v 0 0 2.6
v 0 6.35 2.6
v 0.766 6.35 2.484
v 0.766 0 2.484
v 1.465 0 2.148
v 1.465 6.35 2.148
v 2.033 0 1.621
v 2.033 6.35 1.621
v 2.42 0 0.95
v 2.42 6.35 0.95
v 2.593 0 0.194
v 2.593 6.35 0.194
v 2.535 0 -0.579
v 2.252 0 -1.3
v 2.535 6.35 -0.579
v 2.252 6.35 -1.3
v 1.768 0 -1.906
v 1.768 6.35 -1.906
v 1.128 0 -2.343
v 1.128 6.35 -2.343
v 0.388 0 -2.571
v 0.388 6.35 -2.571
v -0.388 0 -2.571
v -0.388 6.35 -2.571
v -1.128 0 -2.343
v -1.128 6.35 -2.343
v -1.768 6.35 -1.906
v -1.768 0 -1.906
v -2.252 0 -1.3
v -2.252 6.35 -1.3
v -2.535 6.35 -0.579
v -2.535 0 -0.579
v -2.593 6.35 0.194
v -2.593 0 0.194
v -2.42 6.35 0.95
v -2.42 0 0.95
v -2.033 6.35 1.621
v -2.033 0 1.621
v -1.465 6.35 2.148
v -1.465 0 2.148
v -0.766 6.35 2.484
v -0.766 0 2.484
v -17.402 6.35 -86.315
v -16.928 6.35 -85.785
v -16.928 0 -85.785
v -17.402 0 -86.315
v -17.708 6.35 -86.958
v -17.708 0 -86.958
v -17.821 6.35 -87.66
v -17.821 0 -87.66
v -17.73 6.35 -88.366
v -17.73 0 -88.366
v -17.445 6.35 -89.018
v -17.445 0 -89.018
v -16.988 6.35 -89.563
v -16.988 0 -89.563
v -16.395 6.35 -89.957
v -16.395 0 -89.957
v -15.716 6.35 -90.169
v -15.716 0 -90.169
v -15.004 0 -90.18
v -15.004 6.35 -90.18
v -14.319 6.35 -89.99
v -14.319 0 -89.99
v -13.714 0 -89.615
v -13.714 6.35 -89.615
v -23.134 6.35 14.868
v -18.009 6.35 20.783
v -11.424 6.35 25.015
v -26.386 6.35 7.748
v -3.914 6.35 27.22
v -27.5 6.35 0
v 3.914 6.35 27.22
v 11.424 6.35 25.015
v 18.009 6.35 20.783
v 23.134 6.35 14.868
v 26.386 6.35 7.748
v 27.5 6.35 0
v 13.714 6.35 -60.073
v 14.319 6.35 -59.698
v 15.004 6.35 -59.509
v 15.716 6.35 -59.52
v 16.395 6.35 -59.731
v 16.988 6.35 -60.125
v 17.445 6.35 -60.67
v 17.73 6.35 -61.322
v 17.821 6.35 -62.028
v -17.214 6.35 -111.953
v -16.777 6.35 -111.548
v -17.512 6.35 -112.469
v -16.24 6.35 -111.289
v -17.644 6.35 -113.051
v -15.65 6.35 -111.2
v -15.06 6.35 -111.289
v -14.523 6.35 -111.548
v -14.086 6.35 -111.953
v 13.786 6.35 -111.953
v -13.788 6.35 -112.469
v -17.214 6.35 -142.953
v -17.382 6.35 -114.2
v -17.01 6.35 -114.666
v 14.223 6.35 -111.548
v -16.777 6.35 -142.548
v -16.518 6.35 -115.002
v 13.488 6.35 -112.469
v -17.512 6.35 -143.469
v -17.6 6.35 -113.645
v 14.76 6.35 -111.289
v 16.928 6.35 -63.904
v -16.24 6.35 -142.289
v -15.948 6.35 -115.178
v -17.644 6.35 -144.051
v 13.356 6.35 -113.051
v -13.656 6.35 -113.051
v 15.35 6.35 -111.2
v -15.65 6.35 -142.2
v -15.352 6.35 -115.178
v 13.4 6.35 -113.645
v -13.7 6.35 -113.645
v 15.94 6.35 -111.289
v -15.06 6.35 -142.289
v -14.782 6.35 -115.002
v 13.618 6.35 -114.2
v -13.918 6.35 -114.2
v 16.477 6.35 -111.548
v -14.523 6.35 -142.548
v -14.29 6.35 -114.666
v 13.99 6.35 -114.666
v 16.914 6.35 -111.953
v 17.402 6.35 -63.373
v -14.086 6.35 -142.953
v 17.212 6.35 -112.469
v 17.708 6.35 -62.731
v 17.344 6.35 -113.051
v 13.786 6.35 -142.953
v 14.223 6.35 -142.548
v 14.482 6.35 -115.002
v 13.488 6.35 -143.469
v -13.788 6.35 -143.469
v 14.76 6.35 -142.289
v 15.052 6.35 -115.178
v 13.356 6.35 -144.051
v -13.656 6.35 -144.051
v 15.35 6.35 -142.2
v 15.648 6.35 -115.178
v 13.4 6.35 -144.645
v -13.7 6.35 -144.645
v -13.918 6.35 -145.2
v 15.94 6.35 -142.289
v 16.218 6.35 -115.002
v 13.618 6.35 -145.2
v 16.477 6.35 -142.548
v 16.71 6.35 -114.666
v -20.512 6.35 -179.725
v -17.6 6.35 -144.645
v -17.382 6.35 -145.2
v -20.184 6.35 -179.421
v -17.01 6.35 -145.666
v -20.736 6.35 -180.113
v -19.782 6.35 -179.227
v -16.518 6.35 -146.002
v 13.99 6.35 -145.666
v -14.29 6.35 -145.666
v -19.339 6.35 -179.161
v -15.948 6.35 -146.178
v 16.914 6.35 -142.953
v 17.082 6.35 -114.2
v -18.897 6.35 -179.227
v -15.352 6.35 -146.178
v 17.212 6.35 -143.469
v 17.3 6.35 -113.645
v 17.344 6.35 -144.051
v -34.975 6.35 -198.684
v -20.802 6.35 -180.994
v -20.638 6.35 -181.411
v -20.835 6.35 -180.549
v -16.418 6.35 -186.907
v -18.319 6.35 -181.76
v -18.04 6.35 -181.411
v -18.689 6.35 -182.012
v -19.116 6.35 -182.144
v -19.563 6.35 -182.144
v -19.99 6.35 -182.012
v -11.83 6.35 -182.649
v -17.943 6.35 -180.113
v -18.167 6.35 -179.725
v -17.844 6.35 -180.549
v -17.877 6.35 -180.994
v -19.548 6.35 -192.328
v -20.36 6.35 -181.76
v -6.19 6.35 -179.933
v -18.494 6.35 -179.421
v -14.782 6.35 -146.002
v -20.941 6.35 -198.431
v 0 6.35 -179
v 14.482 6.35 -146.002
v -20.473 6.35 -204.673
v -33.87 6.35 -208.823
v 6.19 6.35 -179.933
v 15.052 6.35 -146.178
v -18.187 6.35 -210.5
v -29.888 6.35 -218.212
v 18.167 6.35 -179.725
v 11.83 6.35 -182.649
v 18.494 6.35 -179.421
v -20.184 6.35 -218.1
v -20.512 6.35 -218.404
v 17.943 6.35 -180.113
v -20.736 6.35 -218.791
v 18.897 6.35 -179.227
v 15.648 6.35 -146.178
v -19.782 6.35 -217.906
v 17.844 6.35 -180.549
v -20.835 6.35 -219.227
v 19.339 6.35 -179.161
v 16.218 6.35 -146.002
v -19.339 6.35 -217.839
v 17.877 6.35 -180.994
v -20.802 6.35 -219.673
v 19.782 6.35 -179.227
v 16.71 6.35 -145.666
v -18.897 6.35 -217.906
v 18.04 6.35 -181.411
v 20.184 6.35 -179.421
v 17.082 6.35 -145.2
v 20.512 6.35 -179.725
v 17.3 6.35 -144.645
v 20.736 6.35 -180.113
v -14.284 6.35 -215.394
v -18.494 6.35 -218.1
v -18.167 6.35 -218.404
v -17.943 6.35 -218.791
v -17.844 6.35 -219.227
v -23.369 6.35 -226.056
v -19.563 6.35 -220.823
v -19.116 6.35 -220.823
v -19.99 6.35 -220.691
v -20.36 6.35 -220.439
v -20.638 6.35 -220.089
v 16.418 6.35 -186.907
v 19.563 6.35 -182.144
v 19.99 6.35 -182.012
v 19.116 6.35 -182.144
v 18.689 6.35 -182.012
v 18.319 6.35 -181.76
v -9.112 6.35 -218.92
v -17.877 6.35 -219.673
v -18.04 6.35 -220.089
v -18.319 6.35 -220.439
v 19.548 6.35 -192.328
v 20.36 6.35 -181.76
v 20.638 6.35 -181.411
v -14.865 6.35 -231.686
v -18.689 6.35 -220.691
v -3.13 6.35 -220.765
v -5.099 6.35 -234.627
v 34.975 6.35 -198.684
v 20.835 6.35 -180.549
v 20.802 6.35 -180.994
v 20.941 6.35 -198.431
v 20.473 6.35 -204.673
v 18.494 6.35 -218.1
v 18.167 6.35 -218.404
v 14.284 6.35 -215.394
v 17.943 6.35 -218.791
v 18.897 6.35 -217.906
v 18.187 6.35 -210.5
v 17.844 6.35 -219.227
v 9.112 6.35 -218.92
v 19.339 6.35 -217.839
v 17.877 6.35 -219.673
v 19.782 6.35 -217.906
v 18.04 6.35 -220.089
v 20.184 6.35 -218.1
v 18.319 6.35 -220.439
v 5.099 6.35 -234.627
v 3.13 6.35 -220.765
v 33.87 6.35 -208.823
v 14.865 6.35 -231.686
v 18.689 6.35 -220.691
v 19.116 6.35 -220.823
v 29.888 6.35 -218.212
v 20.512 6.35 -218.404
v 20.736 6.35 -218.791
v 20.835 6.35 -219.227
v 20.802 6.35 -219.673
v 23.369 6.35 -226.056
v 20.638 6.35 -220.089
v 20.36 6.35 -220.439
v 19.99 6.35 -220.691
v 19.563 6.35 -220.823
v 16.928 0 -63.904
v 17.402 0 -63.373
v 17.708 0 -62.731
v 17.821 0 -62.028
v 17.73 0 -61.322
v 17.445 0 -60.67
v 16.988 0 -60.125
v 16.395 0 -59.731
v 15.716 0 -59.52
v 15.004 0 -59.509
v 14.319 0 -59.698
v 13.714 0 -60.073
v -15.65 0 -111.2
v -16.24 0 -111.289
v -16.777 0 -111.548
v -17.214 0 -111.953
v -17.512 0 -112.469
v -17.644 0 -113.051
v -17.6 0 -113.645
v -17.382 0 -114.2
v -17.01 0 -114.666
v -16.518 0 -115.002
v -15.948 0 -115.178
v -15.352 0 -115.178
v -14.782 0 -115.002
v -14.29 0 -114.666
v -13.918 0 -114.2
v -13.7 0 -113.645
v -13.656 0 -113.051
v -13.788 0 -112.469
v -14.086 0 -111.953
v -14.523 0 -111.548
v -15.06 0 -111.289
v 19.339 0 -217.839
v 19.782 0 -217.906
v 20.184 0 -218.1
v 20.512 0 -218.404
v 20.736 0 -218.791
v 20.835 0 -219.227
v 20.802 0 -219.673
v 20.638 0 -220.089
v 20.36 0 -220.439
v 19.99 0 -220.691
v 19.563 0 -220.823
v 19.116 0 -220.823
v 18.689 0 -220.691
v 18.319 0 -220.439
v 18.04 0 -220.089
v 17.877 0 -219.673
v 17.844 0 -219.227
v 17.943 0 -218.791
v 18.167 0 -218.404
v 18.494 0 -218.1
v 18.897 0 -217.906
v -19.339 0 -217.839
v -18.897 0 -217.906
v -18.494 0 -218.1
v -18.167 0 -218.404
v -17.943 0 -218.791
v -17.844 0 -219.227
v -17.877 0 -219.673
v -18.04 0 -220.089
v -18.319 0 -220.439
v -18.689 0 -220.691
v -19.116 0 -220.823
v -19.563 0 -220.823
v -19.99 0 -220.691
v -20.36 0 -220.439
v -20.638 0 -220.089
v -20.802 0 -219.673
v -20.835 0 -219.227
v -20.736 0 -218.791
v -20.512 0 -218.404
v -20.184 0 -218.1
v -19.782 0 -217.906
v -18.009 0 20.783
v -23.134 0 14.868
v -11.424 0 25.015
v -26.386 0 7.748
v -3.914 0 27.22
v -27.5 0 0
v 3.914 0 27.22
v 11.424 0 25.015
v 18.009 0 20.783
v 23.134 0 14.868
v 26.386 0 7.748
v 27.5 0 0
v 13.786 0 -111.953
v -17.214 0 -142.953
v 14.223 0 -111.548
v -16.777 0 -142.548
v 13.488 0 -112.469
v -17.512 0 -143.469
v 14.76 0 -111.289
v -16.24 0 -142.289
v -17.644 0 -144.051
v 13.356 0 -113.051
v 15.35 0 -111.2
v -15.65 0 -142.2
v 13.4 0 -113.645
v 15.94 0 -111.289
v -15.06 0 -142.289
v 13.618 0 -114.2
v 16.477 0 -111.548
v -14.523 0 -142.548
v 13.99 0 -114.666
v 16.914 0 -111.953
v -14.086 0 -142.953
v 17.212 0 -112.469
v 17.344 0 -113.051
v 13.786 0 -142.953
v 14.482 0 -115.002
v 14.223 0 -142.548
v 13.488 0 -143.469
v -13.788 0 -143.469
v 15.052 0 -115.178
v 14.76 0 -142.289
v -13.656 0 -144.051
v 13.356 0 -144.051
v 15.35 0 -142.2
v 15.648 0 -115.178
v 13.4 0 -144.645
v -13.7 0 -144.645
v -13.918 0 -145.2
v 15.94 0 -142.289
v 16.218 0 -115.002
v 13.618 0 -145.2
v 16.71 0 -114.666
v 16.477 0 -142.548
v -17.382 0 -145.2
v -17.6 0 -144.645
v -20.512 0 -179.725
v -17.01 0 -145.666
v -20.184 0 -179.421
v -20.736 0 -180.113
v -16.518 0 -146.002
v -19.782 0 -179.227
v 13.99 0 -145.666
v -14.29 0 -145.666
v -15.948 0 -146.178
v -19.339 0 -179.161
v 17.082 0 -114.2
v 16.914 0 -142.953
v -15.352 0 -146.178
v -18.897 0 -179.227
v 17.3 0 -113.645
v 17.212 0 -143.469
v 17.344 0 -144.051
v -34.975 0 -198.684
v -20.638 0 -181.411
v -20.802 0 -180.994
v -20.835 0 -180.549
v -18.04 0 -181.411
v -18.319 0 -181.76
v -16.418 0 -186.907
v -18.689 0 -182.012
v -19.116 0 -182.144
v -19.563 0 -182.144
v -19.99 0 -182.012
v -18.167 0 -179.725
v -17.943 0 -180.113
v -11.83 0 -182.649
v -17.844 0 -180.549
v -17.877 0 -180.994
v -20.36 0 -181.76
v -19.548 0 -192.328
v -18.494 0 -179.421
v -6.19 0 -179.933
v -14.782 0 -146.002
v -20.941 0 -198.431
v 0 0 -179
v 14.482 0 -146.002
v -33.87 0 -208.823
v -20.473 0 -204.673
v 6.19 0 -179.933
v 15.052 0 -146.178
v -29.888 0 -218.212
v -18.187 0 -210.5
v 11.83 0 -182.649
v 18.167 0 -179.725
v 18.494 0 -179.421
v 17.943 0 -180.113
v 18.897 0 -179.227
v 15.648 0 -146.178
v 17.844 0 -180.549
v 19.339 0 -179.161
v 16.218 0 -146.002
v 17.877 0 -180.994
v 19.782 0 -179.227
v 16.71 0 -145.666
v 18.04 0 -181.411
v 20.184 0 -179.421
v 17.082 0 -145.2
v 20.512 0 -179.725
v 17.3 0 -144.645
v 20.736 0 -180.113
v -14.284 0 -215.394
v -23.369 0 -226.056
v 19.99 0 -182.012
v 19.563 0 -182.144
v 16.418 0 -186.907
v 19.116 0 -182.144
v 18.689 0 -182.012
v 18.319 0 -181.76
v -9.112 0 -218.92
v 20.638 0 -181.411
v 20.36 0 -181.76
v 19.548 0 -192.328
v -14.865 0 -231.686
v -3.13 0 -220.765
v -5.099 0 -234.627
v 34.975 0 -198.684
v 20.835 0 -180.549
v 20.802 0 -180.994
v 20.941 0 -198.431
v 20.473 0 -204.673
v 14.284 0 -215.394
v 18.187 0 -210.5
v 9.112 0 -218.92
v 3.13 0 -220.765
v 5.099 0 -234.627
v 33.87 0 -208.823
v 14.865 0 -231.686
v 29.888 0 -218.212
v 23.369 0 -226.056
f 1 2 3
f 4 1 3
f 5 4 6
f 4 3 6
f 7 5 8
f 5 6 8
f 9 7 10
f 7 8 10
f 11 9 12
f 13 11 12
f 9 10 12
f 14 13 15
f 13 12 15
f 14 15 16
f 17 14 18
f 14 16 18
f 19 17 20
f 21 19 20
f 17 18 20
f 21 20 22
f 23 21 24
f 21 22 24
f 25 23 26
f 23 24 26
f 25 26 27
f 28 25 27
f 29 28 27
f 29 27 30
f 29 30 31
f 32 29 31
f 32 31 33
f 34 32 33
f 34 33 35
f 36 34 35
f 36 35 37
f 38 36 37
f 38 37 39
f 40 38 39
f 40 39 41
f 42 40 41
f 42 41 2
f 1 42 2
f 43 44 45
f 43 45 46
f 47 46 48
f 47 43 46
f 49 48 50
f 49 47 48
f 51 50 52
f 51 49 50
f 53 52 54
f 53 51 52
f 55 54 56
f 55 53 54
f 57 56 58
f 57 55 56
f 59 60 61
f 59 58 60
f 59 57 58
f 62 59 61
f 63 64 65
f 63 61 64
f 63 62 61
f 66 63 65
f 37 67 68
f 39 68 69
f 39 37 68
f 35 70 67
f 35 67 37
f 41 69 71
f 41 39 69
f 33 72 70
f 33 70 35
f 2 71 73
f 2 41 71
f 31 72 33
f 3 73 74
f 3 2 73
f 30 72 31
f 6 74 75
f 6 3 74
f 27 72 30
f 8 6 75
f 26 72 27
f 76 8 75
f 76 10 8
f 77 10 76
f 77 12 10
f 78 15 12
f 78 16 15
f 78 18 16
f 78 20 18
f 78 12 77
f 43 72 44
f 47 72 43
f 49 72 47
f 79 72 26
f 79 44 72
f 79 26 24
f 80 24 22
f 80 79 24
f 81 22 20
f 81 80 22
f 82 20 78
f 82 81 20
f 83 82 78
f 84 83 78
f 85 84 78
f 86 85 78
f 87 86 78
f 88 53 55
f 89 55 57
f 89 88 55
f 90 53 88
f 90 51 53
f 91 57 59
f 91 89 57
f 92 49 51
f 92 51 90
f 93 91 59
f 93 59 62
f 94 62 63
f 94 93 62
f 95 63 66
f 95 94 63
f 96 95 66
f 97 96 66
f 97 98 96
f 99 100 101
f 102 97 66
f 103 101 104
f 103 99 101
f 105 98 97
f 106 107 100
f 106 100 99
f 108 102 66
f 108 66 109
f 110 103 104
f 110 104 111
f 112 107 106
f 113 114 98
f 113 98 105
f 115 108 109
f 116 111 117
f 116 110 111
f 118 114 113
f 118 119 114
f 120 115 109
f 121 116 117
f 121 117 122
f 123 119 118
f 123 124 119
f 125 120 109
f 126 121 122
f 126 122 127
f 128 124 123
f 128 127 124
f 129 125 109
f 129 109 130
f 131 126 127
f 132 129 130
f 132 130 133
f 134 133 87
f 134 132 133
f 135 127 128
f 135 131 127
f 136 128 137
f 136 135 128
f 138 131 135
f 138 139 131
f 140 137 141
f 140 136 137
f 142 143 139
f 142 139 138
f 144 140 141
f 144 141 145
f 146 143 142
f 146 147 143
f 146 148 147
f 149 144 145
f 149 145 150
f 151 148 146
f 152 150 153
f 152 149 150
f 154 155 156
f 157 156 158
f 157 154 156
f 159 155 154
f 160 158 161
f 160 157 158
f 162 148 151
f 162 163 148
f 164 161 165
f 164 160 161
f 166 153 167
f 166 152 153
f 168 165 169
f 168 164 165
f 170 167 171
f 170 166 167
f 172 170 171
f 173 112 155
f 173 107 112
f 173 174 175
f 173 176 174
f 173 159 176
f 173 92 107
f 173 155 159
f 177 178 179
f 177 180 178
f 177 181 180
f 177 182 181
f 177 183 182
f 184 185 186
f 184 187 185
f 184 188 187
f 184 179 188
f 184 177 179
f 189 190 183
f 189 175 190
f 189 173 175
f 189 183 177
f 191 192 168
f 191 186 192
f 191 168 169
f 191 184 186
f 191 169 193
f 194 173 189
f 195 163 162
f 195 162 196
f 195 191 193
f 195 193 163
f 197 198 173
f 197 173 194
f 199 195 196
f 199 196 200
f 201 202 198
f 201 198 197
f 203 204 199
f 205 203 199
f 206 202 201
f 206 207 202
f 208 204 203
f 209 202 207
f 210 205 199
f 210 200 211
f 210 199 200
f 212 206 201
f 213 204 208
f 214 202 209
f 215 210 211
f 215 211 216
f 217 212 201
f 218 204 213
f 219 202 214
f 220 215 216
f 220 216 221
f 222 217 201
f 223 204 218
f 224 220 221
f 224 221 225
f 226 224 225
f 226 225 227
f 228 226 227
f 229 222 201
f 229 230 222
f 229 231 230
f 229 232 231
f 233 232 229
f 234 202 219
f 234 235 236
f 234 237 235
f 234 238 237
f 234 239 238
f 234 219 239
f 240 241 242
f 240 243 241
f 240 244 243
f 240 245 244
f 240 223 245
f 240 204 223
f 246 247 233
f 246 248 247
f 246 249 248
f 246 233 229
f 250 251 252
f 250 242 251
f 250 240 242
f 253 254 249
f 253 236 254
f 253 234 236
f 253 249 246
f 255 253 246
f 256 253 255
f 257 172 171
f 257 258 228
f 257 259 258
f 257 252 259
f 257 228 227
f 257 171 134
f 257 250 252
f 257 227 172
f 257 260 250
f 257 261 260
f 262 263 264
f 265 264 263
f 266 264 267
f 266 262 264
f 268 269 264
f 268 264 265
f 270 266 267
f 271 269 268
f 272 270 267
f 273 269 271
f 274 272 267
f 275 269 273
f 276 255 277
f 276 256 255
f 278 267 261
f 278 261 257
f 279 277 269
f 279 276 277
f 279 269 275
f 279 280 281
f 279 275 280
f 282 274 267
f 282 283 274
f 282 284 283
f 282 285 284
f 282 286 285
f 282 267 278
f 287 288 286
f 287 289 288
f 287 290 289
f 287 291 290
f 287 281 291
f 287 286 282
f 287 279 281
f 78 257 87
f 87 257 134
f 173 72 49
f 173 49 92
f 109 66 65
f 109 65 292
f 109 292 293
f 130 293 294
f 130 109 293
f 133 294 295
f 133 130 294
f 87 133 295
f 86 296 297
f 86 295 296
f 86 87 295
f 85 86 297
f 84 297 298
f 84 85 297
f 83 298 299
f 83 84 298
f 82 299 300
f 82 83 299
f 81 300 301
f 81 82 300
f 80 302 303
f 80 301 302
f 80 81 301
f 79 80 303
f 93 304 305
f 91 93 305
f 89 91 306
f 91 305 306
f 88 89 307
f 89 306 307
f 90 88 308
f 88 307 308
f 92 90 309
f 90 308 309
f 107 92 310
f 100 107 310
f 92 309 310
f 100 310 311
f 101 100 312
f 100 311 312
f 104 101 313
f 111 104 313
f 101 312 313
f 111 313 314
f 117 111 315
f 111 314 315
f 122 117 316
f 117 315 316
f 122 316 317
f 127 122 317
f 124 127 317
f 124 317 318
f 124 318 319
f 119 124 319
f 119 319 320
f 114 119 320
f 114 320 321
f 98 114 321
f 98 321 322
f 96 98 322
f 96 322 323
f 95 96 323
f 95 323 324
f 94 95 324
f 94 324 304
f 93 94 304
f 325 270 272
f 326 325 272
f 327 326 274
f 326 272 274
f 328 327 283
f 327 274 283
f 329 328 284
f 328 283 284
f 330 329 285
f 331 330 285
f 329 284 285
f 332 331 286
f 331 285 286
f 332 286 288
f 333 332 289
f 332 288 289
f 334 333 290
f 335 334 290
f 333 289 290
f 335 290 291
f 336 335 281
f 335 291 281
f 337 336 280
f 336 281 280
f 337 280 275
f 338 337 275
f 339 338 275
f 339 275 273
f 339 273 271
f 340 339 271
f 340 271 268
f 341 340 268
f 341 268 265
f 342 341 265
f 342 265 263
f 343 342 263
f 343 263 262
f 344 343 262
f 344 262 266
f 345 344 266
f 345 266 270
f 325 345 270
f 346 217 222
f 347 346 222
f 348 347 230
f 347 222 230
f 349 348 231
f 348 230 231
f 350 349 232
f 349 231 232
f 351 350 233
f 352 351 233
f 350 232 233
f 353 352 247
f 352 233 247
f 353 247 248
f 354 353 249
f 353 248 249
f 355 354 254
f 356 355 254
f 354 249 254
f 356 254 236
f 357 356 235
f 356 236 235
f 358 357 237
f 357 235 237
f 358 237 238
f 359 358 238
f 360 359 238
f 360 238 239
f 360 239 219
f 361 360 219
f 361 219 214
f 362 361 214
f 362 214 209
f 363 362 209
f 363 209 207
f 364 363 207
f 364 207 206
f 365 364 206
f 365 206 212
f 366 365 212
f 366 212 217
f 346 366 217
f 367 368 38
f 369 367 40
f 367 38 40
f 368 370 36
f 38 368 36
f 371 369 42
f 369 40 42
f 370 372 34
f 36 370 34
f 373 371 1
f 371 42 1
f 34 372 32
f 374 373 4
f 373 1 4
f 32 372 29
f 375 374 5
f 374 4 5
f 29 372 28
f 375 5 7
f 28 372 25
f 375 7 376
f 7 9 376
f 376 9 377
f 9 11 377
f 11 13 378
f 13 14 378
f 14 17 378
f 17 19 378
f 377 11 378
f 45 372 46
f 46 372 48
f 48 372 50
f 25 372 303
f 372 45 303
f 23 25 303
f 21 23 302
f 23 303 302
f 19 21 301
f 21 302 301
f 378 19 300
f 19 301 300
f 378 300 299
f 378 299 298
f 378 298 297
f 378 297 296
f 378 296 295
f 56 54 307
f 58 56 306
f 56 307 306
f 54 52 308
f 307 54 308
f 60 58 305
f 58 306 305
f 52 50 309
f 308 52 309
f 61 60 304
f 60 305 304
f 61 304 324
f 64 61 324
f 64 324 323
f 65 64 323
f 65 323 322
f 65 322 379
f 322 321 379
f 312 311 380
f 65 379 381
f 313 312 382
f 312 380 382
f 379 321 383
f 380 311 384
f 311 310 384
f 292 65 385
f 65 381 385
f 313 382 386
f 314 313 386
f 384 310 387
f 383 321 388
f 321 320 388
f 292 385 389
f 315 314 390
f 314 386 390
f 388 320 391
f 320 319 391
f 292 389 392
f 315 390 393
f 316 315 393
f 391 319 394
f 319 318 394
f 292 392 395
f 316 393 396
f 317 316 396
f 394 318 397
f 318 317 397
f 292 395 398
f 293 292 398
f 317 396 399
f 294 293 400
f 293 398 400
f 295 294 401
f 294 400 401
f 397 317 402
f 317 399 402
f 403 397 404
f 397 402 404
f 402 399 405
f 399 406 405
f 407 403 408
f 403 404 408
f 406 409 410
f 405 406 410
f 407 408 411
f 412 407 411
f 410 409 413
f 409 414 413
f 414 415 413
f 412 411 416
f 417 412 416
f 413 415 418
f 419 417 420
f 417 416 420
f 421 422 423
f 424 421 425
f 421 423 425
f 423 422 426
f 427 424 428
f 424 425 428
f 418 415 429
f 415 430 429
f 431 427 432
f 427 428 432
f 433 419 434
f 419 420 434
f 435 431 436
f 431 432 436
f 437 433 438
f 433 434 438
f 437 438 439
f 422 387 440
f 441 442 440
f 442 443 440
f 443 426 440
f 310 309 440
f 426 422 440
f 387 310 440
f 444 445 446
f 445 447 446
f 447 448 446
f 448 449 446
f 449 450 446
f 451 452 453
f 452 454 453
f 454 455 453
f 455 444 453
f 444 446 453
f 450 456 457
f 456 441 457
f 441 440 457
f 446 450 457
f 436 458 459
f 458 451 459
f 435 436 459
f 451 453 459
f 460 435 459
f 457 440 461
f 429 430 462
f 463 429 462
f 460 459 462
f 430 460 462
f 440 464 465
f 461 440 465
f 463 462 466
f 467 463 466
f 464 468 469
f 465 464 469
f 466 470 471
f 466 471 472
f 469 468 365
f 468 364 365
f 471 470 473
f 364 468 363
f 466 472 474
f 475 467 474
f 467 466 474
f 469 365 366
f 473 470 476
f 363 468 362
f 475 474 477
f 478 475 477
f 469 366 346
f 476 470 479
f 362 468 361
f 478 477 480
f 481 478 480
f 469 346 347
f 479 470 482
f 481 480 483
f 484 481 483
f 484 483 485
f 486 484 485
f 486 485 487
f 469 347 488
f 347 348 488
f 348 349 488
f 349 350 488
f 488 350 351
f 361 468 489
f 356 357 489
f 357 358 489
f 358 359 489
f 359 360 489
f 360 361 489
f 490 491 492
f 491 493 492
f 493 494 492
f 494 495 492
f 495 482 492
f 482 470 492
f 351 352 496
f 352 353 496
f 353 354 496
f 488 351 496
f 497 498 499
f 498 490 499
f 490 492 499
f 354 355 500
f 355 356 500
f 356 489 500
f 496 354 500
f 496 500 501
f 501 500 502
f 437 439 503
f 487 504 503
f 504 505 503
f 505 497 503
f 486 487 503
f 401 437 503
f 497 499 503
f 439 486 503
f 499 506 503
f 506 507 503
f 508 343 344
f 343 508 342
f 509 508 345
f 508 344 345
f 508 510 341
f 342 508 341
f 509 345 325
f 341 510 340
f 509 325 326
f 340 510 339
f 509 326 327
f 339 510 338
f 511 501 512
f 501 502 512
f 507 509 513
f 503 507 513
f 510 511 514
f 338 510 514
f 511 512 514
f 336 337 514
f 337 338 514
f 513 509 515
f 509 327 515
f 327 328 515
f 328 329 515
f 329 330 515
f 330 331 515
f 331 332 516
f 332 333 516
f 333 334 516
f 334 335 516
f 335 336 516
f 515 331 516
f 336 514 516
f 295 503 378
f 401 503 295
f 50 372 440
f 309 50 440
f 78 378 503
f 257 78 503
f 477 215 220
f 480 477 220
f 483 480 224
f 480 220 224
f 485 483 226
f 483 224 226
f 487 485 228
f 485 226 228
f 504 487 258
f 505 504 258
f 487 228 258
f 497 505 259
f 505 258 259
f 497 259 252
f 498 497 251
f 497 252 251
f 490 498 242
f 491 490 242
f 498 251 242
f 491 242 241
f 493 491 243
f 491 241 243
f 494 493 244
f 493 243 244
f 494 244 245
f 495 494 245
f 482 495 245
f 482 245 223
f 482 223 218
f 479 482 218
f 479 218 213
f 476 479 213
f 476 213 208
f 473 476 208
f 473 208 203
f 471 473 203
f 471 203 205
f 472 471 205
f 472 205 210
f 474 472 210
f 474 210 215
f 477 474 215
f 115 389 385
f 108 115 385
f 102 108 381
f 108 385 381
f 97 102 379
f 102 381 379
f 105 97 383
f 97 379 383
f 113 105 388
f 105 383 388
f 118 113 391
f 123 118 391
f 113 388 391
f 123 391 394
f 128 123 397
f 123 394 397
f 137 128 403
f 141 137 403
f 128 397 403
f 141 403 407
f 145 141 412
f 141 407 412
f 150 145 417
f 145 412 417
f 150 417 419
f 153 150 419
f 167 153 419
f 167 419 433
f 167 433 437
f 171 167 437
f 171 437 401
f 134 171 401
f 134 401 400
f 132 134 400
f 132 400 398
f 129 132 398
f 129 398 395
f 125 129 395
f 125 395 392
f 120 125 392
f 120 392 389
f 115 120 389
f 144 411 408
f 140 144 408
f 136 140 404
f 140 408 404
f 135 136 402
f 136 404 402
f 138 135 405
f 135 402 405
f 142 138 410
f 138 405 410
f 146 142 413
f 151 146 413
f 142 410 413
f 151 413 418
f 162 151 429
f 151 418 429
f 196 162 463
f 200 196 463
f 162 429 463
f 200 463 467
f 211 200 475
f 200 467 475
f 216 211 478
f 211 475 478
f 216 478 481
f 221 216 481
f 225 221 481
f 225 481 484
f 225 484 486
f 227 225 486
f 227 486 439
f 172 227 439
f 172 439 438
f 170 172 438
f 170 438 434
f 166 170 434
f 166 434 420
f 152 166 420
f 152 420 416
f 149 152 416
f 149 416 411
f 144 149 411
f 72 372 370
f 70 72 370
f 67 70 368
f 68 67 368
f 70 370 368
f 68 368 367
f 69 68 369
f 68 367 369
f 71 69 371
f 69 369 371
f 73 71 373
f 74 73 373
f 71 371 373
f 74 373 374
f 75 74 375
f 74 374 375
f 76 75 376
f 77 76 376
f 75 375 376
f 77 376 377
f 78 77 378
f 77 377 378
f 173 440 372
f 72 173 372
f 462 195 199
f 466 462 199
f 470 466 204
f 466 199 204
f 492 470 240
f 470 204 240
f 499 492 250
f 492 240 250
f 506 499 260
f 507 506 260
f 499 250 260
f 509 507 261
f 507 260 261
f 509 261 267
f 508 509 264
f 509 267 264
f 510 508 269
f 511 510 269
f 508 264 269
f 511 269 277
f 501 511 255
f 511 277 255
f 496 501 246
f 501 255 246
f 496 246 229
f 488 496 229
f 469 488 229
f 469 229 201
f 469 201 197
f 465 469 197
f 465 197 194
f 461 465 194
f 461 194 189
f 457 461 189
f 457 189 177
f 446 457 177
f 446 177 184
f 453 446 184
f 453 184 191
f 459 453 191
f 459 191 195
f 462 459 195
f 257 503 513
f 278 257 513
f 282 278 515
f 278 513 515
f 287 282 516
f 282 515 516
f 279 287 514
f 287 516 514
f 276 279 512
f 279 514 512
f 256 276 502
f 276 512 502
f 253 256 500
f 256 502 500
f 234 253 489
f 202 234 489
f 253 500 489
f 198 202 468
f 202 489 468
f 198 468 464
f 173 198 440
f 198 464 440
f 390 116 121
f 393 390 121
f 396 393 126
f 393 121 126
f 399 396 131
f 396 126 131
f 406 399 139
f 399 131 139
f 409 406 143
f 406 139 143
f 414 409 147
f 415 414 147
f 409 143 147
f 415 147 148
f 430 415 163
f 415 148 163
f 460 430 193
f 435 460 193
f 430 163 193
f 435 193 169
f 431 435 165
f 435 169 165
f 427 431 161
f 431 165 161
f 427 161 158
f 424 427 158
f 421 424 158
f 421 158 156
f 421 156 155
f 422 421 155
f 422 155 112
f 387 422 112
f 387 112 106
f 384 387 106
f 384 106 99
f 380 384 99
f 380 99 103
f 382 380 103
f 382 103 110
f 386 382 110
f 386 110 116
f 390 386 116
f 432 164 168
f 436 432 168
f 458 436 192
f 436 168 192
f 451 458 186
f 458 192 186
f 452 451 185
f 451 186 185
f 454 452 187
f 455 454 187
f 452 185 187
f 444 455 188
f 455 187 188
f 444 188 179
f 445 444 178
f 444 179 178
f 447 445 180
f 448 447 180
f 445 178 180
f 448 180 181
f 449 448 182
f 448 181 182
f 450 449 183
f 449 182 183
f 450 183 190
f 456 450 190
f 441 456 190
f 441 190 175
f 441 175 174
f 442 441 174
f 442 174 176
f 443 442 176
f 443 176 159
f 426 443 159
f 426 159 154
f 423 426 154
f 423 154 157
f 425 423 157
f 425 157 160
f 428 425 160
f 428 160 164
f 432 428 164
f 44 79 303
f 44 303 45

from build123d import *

# Parameters (mm, degrees)
BOSS_EXTRUDE1_DEPTH     = 6.35
SKETCH2_R               = 2.6
CUT_EXTRUDE1_DEPTH      = 238.676928834
ESQUISSE3_R             = 21
ENL_V_MAT_EXTRU_2_DEPTH = 238.676928834
ESQUISSE7_R             = 1.5
ENL_V_MAT_EXTRU_3_DEPTH = 238.676928834
CUT_EXTRUDE3_DEPTH      = 238.676928834
SKETCH5_R               = 2
CUT_EXTRUDE4_DEPTH      = 238.676928834
SKETCH6_R               = 2
CUT_EXTRUDE5_DEPTH      = 238.676928834


with BuildPart() as part:
    # Sketch1 → Boss-Extrude1 (new body)
    with BuildSketch(Plane(origin=(0, 0, 0), x_dir=(1, 0, 0), z_dir=(0, 1, 0))):
        with BuildLine():
            Line((27.5, 0), (34.975254116, 198.684097441))
            ThreePointArc((34.975254116, 198.684097441), (0, 235), (-34.975254116, 198.684097441))
            Line((-34.975254116, 198.684097441), (-27.5, 0))
            ThreePointArc((-27.5, 0), (0, -27.5), (27.5, 0))
        make_face()
    extrude(amount=BOSS_EXTRUDE1_DEPTH)

    # Sketch2 → Cut-Extrude1 (cut, through all)
    with BuildSketch(Plane(origin=(0, 6.35, 0), x_dir=(1, 0, 0), z_dir=(0, 1, 0))):
        with Locations(Location((0, 0, 0), (0, 0, 270))):
            Circle(SKETCH2_R)
    extrude(amount=-CUT_EXTRUDE1_DEPTH, mode=Mode.SUBTRACT)

    # Esquisse3 → Enlèv. mat.-Extru.2 (cut, through all)
    with BuildSketch(Plane(origin=(0, 6.35, 0), x_dir=(1, 0, 0), z_dir=(0, 1, 0))):
        with Locations(Location((0, 200, 0), (0, 0, 270))):
            Circle(ESQUISSE3_R)
    extrude(amount=-ENL_V_MAT_EXTRU_2_DEPTH, mode=Mode.SUBTRACT)

    # Esquisse7 → Enlèv. mat.-Extru.3 (cut, through all)
    with BuildSketch(Plane(origin=(0, 6.35, 0), x_dir=(1, 0, 0), z_dir=(0, 1, 0))):
        with Locations(Location((-19.339370465, 219.339370465, 0), (0, 0, 270))):
            Circle(ESQUISSE7_R)
        with Locations(Location((19.339370465, 219.339370465, 0), (0, 0, 270))):
            Circle(ESQUISSE7_R)
        with Locations(Location((19.339370465, 180.660629535, 0), (0, 0, 270))):
            Circle(ESQUISSE7_R)
        with Locations(Location((-19.339370465, 180.660629535, 0), (0, 0, 270))):
            Circle(ESQUISSE7_R)
    extrude(amount=-ENL_V_MAT_EXTRU_3_DEPTH, mode=Mode.SUBTRACT)

    # Sketch4 → Cut-Extrude3 (cut, through all)
    with BuildSketch(Plane(origin=(0, 6.35, 0), x_dir=(1, 0, 0), z_dir=(0, 1, 0))):
        with BuildLine():
            Line((13.713919838, 60.073384505), (-16.927857887, 85.784888892))
            ThreePointArc((-16.927857887, 85.784888892), (-17.23599997, 89.306969024), (-13.713919838, 89.615111108))
            Line((-13.713919838, 89.615111108), (16.927857887, 63.90360672))
            ThreePointArc((16.927857887, 63.90360672), (17.23599997, 60.381526588), (13.713919838, 60.073384505))
        make_face()
    extrude(amount=-CUT_EXTRUDE3_DEPTH, mode=Mode.SUBTRACT)

    # Sketch5 → Cut-Extrude4 (cut, through all)
    with BuildSketch(Plane.XZ):
        with Locations(Location((-15.65, -113.2, 0), (0, 0, 90))):
            Circle(SKETCH5_R)
        with Locations(Location((15.35, -113.2, 0), (0, 0, 90))):
            Circle(SKETCH5_R)
        with Locations(Location((15.35, -144.2, 0), (0, 0, 90))):
            Circle(SKETCH5_R)
    extrude(amount=-CUT_EXTRUDE4_DEPTH, mode=Mode.SUBTRACT)

    # Sketch6 → Cut-Extrude5 (cut, through all)
    with BuildSketch(Plane(origin=(0, 6.35, 0), x_dir=(1, 0, 0), z_dir=(0, 1, 0))):
        with Locations(Location((-15.65, 144.2, 0), (0, 0, 270))):
            Circle(SKETCH6_R)
        with Locations(Location((-15.65, 113.2, 0), (0, 0, 270))):
            Circle(SKETCH6_R)
        with Locations(Location((15.35, 113.2, 0), (0, 0, 270))):
            Circle(SKETCH6_R)
        with Locations(Location((15.35, 144.2, 0), (0, 0, 270))):
            Circle(SKETCH6_R)
    extrude(amount=-CUT_EXTRUDE5_DEPTH, mode=Mode.SUBTRACT)


solid = part.part
